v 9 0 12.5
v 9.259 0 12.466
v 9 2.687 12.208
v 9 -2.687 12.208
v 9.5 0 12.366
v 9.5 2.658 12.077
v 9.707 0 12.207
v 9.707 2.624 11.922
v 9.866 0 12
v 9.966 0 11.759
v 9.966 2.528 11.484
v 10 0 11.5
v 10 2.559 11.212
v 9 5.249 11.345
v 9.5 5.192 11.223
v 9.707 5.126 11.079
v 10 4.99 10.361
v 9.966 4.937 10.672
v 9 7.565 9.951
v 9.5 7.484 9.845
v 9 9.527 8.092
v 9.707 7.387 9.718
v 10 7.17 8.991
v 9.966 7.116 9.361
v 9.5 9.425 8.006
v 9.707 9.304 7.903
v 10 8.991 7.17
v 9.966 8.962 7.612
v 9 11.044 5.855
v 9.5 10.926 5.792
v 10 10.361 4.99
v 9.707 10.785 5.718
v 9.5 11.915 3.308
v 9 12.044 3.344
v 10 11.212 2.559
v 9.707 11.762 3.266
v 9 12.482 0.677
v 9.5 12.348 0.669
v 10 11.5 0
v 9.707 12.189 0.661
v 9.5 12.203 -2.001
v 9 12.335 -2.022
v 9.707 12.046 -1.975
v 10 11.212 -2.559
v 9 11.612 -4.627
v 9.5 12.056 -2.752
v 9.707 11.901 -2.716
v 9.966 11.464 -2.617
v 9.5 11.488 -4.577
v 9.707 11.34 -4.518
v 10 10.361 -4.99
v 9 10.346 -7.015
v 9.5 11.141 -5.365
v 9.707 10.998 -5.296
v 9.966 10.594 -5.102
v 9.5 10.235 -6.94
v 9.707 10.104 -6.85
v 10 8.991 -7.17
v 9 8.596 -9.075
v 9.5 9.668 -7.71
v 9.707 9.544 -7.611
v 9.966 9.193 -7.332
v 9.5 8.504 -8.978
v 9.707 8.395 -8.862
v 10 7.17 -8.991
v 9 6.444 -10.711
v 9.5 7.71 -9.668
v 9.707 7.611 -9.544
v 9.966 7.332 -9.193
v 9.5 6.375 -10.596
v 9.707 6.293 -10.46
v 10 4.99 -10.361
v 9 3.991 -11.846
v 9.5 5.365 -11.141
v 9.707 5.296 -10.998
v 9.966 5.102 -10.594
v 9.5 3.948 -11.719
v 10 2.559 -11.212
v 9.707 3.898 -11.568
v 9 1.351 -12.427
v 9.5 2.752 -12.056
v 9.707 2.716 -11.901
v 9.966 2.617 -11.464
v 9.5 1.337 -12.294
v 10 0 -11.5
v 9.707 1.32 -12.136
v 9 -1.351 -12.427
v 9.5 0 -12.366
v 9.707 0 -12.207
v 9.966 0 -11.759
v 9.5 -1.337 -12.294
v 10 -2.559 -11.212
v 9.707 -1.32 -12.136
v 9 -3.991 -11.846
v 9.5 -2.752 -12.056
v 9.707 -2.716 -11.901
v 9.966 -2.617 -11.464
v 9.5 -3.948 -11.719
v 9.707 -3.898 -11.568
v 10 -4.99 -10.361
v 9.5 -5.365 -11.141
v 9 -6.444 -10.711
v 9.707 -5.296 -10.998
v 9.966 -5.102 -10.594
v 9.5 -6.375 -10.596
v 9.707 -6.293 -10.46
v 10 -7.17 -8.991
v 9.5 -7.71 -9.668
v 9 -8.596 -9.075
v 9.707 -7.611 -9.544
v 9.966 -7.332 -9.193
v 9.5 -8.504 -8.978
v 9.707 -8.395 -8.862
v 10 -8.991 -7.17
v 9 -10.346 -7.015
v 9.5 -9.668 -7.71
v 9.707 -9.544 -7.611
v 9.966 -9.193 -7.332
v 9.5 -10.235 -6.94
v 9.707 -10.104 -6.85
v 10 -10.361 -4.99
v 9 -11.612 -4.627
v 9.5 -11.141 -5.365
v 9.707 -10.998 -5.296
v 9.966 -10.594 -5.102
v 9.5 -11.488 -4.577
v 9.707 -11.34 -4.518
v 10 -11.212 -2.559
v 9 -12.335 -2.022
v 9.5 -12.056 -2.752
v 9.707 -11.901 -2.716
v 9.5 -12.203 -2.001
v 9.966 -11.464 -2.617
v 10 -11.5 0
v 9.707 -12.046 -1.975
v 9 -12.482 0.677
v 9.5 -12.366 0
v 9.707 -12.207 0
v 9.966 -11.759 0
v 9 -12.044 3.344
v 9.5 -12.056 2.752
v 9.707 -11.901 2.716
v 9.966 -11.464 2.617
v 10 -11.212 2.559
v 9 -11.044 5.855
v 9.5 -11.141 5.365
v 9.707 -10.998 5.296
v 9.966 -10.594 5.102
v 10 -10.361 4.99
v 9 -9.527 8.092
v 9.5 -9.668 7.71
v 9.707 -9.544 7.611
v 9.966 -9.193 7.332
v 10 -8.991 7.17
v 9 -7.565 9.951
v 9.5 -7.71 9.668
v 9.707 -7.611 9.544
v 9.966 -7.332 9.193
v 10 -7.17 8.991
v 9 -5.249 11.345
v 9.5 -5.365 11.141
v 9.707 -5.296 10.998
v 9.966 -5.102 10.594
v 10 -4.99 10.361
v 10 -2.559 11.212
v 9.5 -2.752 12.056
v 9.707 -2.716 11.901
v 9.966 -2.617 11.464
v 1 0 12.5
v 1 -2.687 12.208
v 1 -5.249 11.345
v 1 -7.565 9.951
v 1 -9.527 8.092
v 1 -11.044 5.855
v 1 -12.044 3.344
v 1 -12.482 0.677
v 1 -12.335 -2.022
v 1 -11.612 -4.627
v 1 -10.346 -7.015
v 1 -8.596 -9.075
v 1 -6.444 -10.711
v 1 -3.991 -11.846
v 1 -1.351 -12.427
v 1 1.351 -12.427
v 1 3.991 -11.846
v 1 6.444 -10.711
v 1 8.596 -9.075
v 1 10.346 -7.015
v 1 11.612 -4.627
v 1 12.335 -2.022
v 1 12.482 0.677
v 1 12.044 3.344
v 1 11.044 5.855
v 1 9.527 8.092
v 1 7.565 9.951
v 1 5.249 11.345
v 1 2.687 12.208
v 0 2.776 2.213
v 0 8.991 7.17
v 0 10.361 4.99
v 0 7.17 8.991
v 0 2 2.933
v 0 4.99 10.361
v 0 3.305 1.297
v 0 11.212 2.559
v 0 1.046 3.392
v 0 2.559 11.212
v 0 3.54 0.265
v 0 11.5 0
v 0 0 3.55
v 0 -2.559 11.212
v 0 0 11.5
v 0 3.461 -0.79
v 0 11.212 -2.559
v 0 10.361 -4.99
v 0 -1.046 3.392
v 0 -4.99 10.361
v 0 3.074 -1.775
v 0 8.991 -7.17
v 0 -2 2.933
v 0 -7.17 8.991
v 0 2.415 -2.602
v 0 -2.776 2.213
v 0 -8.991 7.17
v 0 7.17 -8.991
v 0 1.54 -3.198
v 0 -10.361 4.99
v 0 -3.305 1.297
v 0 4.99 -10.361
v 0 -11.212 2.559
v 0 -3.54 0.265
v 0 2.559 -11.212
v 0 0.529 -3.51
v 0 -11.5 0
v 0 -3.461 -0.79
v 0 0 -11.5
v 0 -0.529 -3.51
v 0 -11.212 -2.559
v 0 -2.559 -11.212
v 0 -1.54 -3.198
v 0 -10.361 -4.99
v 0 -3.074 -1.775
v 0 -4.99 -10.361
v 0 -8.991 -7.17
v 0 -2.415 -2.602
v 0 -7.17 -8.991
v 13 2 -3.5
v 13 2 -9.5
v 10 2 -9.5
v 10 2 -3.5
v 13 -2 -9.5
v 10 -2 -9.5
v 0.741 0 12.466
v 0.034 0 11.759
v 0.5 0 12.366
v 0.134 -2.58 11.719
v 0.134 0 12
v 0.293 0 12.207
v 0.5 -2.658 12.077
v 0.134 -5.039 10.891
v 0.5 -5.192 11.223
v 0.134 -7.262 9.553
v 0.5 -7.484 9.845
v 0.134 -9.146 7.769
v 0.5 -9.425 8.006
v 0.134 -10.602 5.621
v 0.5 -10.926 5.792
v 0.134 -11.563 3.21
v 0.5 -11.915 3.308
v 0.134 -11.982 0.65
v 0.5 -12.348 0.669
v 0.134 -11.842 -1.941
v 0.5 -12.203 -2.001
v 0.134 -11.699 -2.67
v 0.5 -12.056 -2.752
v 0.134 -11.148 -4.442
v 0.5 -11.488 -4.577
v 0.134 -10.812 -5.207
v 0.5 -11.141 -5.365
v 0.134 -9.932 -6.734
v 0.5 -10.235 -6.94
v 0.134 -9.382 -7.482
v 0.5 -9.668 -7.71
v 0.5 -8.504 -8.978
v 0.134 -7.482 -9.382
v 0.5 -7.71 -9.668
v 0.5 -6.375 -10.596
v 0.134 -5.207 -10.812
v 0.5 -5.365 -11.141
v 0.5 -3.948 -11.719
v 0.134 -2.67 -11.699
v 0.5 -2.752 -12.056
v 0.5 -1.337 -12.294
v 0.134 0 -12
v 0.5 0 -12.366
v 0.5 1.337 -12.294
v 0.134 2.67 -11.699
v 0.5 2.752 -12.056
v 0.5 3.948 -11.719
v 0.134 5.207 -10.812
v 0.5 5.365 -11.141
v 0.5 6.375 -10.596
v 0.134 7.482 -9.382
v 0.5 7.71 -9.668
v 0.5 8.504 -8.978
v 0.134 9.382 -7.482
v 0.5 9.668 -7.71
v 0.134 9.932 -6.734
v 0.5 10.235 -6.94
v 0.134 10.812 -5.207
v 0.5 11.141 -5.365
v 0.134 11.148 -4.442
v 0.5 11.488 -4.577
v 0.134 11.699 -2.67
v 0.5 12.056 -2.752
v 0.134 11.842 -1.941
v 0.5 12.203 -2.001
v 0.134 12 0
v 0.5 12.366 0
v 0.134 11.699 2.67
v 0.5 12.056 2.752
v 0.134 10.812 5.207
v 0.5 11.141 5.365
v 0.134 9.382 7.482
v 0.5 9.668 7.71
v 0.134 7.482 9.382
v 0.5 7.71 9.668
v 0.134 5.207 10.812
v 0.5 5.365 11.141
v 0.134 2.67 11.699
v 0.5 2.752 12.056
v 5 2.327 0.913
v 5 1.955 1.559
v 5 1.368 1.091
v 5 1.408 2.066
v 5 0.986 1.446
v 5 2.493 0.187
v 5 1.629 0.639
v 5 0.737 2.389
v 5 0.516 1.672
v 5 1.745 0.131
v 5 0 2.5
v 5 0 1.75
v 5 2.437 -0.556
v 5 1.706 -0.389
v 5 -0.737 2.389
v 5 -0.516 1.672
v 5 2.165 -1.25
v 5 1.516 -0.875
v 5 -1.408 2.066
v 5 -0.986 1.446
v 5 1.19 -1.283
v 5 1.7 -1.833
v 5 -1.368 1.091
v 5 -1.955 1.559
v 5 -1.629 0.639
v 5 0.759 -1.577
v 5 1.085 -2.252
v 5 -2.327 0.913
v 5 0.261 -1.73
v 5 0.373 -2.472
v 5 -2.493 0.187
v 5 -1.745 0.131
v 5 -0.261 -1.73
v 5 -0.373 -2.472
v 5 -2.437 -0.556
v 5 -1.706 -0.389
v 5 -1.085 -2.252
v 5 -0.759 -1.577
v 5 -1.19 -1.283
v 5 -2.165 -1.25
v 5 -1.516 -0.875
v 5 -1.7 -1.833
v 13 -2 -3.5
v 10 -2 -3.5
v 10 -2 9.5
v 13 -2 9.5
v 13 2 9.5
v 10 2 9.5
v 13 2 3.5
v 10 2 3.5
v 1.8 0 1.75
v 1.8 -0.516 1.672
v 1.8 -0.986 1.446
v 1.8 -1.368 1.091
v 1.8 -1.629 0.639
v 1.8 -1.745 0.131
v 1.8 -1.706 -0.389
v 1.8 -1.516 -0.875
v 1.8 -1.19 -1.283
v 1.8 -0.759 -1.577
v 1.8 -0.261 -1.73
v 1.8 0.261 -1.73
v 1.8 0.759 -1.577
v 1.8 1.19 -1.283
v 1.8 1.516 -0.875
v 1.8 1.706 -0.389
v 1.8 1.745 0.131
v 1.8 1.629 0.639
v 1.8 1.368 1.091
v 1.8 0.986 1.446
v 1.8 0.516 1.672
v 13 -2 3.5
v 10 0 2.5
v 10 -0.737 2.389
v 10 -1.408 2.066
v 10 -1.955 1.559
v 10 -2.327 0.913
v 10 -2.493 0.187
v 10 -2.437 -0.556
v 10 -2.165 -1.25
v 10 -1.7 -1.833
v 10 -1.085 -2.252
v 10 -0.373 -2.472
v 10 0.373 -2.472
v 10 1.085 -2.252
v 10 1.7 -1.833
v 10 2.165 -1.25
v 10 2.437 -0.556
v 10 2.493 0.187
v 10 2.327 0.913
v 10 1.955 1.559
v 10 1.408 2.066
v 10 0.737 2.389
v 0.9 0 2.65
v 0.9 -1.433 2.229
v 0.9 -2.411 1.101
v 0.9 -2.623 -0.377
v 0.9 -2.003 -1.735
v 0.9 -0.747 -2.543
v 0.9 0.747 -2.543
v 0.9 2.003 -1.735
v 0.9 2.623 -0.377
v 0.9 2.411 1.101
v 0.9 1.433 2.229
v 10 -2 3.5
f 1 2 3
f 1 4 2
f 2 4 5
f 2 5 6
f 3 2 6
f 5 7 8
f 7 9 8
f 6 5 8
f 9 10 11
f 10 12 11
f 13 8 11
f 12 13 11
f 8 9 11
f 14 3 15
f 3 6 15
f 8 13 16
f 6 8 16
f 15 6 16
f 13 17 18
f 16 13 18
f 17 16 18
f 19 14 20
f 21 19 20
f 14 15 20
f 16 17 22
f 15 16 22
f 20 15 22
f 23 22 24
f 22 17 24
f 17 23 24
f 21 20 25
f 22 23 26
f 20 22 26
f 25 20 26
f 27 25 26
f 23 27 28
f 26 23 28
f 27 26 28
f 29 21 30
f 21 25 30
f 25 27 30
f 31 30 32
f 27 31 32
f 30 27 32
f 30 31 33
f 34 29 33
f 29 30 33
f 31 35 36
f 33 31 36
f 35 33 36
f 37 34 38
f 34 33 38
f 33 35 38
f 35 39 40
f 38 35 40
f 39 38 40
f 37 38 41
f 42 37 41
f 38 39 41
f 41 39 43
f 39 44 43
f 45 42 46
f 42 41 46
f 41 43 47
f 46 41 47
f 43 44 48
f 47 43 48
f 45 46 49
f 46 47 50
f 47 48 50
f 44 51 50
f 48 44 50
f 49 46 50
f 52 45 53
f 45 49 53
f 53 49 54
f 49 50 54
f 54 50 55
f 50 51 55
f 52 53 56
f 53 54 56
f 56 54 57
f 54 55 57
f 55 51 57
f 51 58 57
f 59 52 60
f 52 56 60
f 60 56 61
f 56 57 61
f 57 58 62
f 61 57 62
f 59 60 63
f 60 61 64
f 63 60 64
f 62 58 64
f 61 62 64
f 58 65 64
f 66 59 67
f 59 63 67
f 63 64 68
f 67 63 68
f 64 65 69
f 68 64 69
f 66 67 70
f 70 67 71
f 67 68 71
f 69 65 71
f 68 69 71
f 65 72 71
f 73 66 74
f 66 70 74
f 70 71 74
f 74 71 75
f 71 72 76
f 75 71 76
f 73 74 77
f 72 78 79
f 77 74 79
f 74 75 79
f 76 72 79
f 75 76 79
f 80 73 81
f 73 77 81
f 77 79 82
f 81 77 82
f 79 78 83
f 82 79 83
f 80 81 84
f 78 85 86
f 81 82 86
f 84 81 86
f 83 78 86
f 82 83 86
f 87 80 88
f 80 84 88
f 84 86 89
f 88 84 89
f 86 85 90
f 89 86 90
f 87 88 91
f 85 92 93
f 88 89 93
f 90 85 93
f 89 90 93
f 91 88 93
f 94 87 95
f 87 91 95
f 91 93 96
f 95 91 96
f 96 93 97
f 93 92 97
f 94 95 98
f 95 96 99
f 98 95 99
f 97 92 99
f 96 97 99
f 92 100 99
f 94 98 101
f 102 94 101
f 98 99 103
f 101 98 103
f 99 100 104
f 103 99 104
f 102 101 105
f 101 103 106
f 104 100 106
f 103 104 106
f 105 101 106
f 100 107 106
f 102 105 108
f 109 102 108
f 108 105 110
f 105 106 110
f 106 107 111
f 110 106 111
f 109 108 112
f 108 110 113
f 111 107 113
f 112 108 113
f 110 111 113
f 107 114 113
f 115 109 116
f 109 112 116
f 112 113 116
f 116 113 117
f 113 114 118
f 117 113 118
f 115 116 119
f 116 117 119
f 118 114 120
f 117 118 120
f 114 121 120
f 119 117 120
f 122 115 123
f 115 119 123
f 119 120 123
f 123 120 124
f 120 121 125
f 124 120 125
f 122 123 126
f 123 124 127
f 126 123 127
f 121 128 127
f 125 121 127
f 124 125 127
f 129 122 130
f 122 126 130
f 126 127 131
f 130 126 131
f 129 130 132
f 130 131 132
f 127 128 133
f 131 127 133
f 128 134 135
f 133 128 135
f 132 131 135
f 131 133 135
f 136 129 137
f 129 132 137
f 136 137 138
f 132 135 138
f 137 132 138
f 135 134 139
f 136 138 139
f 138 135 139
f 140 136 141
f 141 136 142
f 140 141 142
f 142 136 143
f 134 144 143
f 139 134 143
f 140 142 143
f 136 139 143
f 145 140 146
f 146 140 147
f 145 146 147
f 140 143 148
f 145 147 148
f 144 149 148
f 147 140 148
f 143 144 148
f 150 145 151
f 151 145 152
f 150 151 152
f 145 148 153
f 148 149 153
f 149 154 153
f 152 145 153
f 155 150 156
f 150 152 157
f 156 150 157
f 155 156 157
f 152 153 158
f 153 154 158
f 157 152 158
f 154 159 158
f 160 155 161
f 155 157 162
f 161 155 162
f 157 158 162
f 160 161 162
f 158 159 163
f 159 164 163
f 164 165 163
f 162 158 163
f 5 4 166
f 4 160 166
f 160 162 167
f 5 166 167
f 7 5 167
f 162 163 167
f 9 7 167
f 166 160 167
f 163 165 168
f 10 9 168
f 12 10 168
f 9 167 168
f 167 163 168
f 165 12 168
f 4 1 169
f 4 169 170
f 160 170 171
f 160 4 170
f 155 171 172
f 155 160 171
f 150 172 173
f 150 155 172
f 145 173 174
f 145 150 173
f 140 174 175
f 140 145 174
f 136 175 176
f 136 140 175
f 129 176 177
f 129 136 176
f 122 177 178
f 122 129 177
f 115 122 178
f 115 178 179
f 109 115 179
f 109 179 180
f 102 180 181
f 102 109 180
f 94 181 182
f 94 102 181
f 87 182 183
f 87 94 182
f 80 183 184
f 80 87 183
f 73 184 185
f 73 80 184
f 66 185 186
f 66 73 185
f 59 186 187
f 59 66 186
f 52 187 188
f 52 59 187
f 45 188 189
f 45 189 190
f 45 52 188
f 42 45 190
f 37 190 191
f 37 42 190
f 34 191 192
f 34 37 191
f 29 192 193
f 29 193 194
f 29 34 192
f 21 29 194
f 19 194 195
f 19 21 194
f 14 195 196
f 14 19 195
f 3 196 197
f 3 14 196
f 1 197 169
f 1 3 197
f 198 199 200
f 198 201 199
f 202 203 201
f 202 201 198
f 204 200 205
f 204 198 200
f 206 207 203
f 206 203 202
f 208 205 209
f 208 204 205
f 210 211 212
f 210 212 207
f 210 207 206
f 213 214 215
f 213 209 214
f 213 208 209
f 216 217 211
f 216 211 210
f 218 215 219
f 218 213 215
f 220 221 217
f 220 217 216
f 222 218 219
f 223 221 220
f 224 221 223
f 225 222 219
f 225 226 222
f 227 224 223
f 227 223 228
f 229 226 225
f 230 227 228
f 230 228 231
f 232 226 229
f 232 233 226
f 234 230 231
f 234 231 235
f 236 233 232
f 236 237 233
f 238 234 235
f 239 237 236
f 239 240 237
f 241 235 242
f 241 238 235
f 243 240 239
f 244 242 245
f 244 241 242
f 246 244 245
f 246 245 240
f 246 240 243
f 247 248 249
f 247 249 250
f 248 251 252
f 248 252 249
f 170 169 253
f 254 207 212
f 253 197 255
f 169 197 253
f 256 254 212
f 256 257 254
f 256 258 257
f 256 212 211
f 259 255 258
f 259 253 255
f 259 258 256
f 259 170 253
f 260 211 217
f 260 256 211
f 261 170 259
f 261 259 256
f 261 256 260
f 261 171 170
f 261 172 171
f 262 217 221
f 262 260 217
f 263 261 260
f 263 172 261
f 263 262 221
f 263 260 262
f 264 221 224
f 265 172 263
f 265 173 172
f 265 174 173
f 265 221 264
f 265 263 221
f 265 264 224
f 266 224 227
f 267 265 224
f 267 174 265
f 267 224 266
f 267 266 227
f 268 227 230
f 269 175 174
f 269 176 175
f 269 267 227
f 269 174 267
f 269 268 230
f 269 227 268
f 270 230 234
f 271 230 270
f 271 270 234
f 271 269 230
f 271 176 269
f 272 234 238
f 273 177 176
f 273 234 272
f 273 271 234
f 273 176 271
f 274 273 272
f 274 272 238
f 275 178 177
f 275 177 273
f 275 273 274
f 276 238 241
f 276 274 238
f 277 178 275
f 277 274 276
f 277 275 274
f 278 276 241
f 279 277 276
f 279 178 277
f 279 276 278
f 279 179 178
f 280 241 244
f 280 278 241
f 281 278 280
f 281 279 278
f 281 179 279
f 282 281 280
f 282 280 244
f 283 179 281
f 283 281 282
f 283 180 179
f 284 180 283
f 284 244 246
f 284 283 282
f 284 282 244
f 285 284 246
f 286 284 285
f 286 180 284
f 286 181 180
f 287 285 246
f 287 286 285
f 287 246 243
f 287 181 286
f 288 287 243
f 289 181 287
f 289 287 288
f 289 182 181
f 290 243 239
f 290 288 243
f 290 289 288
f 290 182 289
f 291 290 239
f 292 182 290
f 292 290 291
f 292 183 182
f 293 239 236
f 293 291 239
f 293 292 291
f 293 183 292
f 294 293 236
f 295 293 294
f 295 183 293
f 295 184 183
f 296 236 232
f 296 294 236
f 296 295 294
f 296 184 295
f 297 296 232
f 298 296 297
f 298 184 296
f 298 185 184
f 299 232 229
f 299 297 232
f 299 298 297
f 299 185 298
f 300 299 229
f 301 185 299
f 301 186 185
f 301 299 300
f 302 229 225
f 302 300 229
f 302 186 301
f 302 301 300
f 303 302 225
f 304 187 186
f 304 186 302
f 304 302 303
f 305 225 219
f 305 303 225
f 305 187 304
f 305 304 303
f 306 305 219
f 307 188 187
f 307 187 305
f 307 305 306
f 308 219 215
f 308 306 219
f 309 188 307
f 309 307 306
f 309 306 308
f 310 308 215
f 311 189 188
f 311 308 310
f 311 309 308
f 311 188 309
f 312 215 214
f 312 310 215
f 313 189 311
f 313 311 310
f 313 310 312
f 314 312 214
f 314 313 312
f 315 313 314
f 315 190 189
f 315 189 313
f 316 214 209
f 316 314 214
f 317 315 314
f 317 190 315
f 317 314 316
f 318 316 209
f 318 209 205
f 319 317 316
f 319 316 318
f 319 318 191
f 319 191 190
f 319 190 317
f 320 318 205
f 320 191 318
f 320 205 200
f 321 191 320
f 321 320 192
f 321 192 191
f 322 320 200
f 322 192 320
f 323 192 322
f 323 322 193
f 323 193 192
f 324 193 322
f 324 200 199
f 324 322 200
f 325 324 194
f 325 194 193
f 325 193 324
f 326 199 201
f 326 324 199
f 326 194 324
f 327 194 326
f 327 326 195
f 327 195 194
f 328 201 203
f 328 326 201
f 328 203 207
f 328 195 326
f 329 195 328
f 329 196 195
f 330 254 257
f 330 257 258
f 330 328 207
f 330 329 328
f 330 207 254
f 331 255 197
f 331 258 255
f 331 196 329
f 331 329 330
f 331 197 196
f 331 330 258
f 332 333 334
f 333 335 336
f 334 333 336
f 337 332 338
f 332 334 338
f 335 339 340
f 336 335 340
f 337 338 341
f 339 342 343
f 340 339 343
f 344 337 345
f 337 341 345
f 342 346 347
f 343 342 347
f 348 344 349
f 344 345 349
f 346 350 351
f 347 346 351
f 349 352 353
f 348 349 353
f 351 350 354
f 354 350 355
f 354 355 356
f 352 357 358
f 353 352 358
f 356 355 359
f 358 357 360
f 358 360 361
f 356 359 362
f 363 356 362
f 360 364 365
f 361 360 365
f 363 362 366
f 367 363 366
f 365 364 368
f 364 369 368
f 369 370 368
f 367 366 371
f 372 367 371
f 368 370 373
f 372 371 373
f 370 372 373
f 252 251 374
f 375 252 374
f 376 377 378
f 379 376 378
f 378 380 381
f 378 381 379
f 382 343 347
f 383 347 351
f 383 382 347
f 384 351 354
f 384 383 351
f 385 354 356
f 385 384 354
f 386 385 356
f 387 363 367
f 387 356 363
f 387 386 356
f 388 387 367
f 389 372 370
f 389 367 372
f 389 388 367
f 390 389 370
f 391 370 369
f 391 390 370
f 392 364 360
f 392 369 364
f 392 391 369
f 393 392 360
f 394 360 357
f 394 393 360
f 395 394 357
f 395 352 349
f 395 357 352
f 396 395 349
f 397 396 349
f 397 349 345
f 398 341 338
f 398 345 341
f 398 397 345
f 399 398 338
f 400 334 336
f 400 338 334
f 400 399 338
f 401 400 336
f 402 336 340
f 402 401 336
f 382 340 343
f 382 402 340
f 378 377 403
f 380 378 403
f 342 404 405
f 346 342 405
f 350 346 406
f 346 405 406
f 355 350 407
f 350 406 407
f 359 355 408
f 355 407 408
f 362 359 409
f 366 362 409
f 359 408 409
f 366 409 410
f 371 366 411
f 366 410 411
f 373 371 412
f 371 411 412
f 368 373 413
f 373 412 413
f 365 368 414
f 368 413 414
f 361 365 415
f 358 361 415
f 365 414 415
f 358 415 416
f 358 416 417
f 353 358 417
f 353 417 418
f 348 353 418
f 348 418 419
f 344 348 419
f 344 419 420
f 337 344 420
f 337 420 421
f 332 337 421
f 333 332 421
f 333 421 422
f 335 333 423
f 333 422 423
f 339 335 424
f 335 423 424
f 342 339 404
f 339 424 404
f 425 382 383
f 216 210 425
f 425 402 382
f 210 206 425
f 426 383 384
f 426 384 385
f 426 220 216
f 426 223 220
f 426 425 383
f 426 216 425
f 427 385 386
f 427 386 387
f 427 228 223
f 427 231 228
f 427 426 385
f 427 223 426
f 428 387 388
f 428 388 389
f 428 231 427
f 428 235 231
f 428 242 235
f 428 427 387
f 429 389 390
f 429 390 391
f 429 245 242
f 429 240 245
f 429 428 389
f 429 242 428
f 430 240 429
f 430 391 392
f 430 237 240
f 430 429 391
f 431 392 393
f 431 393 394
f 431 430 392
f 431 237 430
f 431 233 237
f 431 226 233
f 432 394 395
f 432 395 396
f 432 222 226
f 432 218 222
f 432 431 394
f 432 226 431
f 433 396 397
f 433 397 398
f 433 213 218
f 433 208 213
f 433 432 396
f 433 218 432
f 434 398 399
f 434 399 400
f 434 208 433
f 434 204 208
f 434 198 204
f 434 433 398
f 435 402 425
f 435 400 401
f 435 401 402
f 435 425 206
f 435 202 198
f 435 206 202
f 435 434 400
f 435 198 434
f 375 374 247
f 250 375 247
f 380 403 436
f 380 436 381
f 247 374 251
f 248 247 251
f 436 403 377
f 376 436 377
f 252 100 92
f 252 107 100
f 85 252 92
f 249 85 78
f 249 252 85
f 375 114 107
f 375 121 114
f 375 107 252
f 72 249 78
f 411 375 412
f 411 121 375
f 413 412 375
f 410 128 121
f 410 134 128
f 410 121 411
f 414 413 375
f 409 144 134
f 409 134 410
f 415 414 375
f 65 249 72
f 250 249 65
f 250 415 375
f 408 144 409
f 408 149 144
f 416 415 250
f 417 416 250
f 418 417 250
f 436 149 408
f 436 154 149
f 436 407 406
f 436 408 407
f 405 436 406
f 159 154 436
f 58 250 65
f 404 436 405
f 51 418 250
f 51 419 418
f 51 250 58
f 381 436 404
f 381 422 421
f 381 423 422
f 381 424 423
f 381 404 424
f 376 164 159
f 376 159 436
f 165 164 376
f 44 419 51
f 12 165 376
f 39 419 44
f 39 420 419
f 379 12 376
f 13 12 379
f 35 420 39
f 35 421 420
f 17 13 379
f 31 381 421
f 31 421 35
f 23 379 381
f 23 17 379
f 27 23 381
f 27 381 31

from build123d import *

# Parameters (mm, degrees)
F0_W     = 13
F0_H     = 12.5
F2_R     = 12.5
F2_W     = 4
F2_H     = 6
F3_DEPTH = 3
F4_W     = 7.990635
F4_H     = 2.5
F8_R     = 1


with BuildPart() as f1:
    # F0 (on Front) → F1 (revolve)
    with BuildSketch(Plane.XZ):
        with Locations((6.5, 6.25)):
            Rectangle(F0_W, F0_H)
    revolve(axis=Axis((9.685505, 0, 0), (1, 0, 0)))

    # F2 (on face) → F3 (cut)
    with BuildSketch(Plane.YZ.offset(13)):
        Circle(F2_R)
        with Locations((0, -6.5)):
            Rectangle(F2_W, F2_H, mode=Mode.SUBTRACT)
        with Locations((0, 6.5)):
            Rectangle(F2_W, F2_H, mode=Mode.SUBTRACT)
    extrude(amount=-F3_DEPTH, mode=Mode.SUBTRACT)

    # F4 (on Front) → F5 (revolve, cut)
    with BuildSketch(Plane.XZ):
        with Locations((8.995317, 1.25)):
            Rectangle(F4_W, F4_H)
    revolve(axis=Axis((7.811431, 0, 0), (1, 0, 0)), mode=Mode.SUBTRACT)

    # F6 (on Front) → F7 (revolve, cut)
    with BuildSketch(Plane.XZ):
        Polygon((0, 3.55), (0, 0), (6.232518, 0), (6.232518, 1.75), (1.8, 1.75), align=None)
    revolve(axis=Axis((5.52431, 0, 0), (1, 0, 0)), mode=Mode.SUBTRACT)

    # F8
    f8_edges = [f1.edges().sort_by_distance(p)[0] for p in [
        (10, 0, -12.5),
        (0, 0, -12.5),
    ]]
    fillet(f8_edges, radius=F8_R)


solid = f1.part
